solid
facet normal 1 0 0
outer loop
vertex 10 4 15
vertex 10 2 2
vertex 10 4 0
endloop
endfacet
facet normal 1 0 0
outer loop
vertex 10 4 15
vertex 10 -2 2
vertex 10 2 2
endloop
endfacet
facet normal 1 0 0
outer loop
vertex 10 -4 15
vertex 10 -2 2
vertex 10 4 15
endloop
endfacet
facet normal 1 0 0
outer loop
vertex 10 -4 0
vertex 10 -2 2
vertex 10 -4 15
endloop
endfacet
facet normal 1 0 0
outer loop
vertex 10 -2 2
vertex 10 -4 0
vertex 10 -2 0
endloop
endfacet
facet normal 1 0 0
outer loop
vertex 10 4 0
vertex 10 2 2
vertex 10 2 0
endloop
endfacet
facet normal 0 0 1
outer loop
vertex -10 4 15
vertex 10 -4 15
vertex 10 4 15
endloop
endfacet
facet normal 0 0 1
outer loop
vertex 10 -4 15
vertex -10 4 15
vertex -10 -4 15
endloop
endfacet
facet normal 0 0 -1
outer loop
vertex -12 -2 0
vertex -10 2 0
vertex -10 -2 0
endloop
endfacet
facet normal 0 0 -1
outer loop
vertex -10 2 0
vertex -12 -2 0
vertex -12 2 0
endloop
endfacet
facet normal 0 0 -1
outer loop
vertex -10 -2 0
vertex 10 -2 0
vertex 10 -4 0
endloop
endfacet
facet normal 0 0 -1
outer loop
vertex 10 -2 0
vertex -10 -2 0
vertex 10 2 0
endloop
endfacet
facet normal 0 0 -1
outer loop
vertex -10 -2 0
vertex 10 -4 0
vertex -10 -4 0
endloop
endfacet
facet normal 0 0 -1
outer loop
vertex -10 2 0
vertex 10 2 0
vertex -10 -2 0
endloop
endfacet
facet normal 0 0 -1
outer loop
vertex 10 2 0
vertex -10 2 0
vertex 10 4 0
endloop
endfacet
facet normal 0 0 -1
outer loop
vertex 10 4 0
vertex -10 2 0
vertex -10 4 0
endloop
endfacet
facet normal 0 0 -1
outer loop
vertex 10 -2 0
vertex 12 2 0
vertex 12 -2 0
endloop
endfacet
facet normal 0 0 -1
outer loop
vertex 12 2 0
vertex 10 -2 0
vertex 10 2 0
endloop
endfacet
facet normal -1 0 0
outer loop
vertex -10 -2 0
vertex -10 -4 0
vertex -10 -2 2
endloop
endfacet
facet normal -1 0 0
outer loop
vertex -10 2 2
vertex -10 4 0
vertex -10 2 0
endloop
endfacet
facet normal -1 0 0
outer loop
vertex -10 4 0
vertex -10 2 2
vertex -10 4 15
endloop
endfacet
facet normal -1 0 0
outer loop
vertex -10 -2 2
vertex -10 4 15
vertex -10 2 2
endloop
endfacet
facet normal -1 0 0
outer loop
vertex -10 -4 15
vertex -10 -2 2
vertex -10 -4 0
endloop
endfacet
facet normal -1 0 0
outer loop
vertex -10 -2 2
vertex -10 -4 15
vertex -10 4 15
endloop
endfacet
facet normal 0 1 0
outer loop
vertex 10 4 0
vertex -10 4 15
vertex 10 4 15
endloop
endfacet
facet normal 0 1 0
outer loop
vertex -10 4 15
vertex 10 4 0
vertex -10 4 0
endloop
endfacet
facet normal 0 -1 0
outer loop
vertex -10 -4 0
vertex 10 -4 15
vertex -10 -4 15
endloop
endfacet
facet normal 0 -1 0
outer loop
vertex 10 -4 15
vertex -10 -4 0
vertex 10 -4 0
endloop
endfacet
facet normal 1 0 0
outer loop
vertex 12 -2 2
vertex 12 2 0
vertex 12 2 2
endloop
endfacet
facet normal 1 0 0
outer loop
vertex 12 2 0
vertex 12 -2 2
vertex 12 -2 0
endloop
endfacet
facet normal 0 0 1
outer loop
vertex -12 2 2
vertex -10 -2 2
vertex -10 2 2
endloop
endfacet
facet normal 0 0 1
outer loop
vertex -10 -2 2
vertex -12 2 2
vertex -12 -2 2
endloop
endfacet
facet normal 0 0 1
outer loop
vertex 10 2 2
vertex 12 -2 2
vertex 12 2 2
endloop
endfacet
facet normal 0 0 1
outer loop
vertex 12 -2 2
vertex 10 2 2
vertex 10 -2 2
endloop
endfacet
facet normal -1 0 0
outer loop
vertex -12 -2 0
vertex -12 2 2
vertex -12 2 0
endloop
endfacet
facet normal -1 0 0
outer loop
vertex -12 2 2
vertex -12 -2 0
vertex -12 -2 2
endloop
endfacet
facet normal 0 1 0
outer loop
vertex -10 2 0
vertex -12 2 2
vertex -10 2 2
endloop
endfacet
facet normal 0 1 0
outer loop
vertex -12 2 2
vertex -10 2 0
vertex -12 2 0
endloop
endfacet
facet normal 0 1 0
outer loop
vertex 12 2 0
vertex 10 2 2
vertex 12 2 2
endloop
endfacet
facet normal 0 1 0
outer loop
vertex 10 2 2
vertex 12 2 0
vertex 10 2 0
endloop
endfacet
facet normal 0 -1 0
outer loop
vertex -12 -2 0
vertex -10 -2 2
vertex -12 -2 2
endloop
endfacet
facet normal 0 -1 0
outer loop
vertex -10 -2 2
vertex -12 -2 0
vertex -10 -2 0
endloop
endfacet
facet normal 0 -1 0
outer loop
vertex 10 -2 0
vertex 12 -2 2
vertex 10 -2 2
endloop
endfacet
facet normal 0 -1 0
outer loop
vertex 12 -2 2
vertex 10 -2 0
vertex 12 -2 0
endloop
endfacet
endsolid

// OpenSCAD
inserto(20, 15);

//// 
module inserto(ancho, alto, vacio = true) {
    if (vacio) {
        ancho_pieza = 8;
        largo_saliente = 2;
        alto_saliente = 2;

        inserto2(ancho, alto, ancho_pieza, largo_saliente, alto_saliente, vacio);
    } else {
        dif = 0.25;
        ancho_pieza = 8 - dif;
        largo_saliente = 2 - dif;
        alto_saliente = 2 - dif;

        inserto2(ancho, alto, ancho_pieza, largo_saliente, alto_saliente, vacio);
    }
}

module inserto2(ancho, alto, ancho_pieza, largo_saliente, alto_saliente, vacio) {
    translate([-ancho/2, -(ancho_pieza/2), 0]) 
            cube([ancho, ancho_pieza, alto]);
        translate([-(ancho + largo_saliente * 2)/2, -(ancho_pieza - 4)/2, 0]) 
            cube([ancho + largo_saliente * 2, ancho_pieza - 4, alto_saliente]);
}
